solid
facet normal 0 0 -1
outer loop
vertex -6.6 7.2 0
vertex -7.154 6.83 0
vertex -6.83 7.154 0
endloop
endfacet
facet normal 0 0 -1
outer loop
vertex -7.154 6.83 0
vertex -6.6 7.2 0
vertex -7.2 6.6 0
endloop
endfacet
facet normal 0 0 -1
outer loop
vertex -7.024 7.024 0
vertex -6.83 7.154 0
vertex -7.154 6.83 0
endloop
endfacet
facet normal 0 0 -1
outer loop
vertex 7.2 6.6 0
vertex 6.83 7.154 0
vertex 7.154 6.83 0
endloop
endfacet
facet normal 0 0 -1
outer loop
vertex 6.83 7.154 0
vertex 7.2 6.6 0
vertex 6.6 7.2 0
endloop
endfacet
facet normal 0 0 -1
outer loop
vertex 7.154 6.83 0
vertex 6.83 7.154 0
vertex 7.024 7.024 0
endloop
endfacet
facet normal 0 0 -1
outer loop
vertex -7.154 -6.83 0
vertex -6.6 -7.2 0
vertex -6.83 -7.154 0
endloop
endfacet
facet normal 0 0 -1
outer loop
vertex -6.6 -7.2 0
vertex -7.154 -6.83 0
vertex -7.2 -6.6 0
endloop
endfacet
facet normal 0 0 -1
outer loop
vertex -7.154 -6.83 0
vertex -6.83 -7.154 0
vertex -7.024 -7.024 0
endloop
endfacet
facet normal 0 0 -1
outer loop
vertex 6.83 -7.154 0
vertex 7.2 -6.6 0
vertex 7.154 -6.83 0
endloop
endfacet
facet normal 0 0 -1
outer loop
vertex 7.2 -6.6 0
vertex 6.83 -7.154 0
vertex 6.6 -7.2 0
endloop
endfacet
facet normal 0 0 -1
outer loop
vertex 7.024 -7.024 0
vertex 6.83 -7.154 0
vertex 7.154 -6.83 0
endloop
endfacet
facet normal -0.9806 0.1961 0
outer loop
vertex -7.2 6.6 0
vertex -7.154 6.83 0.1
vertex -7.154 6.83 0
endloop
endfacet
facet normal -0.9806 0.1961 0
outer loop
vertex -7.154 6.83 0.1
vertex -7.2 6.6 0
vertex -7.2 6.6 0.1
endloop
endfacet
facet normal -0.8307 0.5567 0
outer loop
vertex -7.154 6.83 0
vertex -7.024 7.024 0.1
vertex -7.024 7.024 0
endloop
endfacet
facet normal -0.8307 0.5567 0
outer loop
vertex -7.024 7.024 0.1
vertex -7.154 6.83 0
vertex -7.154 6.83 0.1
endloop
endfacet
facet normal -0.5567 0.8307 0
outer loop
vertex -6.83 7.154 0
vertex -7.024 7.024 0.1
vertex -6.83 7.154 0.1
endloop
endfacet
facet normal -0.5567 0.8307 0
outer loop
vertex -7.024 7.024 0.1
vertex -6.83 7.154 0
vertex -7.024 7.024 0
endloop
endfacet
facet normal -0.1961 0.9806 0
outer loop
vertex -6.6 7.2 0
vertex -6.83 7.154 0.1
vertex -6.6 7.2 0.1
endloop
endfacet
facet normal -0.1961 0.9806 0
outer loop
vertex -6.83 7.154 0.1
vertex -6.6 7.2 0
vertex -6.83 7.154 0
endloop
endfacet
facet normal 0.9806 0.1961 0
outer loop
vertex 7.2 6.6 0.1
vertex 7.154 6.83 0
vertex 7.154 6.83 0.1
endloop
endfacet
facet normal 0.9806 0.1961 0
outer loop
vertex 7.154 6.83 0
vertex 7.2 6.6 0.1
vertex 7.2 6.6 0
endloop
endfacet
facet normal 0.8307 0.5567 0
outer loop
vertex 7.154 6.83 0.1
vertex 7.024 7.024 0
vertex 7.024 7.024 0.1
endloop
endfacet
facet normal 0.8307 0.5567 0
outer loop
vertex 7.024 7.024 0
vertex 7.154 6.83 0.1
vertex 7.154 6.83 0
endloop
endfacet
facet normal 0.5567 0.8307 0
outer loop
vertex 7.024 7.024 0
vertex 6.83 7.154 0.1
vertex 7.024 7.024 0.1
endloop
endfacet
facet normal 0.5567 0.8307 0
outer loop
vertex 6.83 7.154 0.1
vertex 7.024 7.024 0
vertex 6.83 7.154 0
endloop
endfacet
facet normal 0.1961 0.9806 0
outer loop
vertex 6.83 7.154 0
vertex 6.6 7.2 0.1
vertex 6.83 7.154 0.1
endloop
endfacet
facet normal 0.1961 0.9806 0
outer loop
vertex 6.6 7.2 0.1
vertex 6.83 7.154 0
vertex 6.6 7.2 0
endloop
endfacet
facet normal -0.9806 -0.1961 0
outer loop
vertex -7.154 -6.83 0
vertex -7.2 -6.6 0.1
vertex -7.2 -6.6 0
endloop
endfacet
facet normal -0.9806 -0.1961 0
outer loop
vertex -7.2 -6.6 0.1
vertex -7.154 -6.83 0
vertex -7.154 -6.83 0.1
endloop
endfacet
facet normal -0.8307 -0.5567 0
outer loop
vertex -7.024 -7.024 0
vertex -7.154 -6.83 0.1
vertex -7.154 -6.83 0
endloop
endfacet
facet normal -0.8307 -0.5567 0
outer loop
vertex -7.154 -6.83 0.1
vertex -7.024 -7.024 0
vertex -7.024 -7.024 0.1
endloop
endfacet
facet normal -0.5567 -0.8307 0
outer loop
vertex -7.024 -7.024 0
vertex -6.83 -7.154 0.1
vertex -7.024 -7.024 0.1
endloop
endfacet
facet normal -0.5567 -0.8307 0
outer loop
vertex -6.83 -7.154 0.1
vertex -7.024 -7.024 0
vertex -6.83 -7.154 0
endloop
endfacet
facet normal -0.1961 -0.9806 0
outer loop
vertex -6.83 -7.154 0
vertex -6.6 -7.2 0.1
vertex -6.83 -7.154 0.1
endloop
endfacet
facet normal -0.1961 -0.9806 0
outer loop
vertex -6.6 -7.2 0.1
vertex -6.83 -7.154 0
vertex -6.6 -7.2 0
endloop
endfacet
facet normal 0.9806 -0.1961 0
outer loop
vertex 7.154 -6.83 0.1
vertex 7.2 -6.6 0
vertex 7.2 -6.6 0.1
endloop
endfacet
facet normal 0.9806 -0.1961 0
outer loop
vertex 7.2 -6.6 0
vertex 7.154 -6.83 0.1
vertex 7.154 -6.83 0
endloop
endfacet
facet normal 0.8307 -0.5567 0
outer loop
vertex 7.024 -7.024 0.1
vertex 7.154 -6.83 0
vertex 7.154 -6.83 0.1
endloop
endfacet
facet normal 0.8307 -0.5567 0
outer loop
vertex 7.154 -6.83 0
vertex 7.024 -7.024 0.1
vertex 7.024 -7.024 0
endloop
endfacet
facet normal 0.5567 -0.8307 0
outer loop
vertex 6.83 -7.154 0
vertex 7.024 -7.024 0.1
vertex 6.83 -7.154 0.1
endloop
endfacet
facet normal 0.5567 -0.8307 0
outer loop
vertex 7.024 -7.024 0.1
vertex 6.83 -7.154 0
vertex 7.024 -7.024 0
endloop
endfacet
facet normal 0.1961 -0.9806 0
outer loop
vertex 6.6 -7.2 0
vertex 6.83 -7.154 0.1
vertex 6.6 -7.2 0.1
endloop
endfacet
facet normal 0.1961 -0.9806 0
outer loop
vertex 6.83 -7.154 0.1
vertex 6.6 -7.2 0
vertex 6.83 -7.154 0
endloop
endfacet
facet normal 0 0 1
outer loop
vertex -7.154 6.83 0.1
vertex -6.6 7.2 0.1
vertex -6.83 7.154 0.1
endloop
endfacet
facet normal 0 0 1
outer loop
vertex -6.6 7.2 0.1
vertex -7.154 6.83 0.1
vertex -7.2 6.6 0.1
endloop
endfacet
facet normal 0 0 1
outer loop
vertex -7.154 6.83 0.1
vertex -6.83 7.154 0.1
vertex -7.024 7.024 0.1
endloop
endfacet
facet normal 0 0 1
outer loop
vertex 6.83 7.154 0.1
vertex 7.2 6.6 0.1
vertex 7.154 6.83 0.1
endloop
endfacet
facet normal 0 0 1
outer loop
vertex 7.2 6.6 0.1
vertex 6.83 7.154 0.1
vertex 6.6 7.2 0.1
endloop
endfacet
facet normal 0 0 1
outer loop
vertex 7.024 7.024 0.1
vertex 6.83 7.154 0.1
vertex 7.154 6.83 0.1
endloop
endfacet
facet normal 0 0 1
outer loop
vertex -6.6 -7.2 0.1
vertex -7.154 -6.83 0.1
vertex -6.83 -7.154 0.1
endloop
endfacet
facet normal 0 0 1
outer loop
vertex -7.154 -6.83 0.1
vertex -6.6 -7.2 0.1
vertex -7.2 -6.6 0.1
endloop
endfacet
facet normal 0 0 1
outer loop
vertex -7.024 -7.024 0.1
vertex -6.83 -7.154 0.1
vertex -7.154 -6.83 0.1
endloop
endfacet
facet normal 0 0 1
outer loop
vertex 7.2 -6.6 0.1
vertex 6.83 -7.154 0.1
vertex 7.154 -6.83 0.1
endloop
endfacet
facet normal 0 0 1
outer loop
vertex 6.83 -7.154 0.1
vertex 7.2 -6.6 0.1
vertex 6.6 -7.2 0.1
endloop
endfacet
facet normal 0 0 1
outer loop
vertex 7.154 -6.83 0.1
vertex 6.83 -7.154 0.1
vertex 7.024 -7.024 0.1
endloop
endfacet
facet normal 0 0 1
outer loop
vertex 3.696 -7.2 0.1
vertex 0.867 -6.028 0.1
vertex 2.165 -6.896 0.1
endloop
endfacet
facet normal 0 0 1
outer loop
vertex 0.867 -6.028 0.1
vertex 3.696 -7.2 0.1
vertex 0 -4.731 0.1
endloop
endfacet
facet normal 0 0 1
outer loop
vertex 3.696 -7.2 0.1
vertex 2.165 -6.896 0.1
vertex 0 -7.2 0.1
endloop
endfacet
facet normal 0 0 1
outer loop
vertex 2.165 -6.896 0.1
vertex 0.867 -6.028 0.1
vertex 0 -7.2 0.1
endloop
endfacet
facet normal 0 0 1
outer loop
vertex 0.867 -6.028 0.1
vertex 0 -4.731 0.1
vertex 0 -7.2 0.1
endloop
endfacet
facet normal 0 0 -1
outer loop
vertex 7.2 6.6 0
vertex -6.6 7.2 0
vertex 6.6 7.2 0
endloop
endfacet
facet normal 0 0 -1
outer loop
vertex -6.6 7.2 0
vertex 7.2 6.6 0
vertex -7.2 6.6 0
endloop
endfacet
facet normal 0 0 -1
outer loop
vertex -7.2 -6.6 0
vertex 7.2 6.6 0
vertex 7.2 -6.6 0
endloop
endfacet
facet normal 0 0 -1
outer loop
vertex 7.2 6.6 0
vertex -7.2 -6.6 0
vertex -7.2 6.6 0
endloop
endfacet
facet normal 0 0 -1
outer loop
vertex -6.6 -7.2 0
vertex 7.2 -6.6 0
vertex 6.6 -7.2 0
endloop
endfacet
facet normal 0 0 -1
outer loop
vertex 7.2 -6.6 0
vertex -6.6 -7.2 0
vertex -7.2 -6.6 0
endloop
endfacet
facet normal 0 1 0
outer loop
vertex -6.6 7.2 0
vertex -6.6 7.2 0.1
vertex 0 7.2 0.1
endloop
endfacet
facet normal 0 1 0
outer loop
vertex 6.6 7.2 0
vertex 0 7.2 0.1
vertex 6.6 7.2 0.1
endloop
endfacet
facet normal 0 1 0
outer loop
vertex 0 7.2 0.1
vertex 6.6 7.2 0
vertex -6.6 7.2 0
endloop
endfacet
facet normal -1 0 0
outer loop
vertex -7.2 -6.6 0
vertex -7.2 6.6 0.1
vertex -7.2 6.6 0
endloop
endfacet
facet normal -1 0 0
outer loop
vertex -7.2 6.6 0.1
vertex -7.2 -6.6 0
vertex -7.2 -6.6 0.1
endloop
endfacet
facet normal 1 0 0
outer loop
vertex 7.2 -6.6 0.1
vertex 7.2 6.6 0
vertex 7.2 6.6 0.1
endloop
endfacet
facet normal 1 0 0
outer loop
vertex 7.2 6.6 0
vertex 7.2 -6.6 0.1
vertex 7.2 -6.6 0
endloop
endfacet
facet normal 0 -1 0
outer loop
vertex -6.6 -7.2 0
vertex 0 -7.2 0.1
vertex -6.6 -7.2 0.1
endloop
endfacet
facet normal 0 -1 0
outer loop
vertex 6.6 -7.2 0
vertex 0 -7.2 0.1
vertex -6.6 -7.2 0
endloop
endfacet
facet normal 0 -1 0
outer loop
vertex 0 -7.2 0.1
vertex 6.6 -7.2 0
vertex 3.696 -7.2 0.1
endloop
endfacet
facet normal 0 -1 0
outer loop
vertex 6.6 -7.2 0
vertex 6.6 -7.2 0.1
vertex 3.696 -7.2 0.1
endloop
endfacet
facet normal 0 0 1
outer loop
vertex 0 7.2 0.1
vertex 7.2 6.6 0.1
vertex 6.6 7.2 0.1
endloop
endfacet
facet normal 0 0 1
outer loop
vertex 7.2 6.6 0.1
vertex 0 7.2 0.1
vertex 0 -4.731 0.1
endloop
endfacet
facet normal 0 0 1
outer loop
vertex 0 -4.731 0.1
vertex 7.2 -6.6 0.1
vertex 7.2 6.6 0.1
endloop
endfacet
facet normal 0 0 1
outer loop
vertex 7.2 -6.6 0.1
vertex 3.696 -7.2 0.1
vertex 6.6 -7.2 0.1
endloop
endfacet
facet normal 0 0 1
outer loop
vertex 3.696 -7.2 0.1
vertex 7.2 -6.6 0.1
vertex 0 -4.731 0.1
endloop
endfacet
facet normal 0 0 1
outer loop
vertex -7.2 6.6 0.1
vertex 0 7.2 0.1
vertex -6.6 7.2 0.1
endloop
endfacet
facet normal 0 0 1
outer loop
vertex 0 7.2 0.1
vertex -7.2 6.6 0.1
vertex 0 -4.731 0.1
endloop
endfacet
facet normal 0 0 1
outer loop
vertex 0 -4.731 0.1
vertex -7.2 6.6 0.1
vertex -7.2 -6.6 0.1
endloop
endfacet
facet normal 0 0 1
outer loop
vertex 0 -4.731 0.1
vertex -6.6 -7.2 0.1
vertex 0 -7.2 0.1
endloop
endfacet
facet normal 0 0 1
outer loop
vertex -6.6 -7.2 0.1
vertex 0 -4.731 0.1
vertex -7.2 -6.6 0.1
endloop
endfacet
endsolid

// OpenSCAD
// file: ../p/3-16tndis.scad
use <../lib.scad>
function ldraw_lib__3_16tndis() = [
// 0 Disc Negative Truncated 0.1875
// 0 Name: 3-16tndis.dat
// 0 Author: Massimo Maso [Sirio]
// 0 !LDRAW_ORG Primitive UPDATE 2022-02
// 0 !LICENSE Licensed under CC BY 2.0 and CC BY 4.0 : see CAreadme.txt
// 
// 0 BFC CERTIFY CCW
  [0,"BFC","CERTIFY"],
  [0,"BFC","CCW"],
// 
// 0 !HISTORY 2022-03-06 [PTadmin] Official Update 2022-02
// 
// 
// 3 16 1 0 .9239 .9239 0 .3827 1 0 0
  [3,16,1,0,.9239,.9239,0,.3827,1,0,0],
// 3 16 1 0 .9239 .7071 0 .7071 .9239 0 .3827
  [3,16,1,0,.9239,.7071,0,.7071,.9239,0,.3827],
// 3 16 1 0 .9239 .3827 0 .9239 .7071 0 .7071
  [3,16,1,0,.9239,.3827,0,.9239,.7071,0,.7071],
];
makepoly(ldraw_lib__3_16tndis(), line=0.2);
// file: ../p/3-16chrd.scad
use <../lib.scad>
function ldraw_lib__3_16chrd() = [
// 0 Chord 0.1875
// 0 Name: 3-16chrd.dat
// 0 Author: Niels Karsdorp [nielsk]
// 0 !LDRAW_ORG Primitive UPDATE 2009-01
// 0 !LICENSE Licensed under CC BY 2.0 and CC BY 4.0 : see CAreadme.txt
// 
// 0 BFC CERTIFY CCW
  [0,"BFC","CERTIFY"],
  [0,"BFC","CCW"],
// 
// 0 !HISTORY 2009-05-02 [PTadmin] Official Update 2009-01
// 
// 
// 4 16 1 0 0 0.9239 0 0.3827 0.7071 0 0.7071 0.3827 0 0.9239
  [4,16,1,0,0,0.9239,0,0.3827,0.7071,0,0.7071,0.3827,0,0.9239],
// 0
// 
];
makepoly(ldraw_lib__3_16chrd(), line=0.2);
// file: ../p/1-4cyli.scad
use <../lib.scad>
function ldraw_lib__1_4cyli() = [
// 0 Cylinder 0.25
// 0 Name: 1-4cyli.dat
// 0 Author: James Jessiman
// 0 !LDRAW_ORG Primitive UPDATE 2012-01
// 0 !LICENSE Licensed under CC BY 2.0 and CC BY 4.0 : see CAreadme.txt
// 
// 0 BFC CERTIFY CCW
  [0,"BFC","CERTIFY"],
  [0,"BFC","CCW"],
// 
// 0 !HISTORY 2002-03-23 [sbliss] Added BFC statement.
// 0 !HISTORY 2002-04-25 [PTadmin] Official Update 2002-02
// 0 !HISTORY 2007-06-22 [PTadmin] Header formatted for Contributor Agreement
// 0 !HISTORY 2008-07-01 [PTadmin] Official Update 2008-01
// 0 !HISTORY 2012-02-16 [Philo] Changed to CCW
// 0 !HISTORY 2012-03-30 [PTadmin] Official Update 2012-01
// 
// 
// 4 16 1 1 0 0.9239 1 0.3827 0.9239 0 0.3827 1 0 0
  [4,16,1,1,0,0.9239,1,0.3827,0.9239,0,0.3827,1,0,0],
// 5 24 1 0 0 1 1 0 0.9239 0 0.3827 1 0 -1
  [5,24,1,0,0,1,1,0,0.9239,0,0.3827,1,0,-1],
// 4 16 0.9239 1 0.3827 0.7071 1 0.7071 0.7071 0 0.7071 0.9239 0 0.3827
  [4,16,0.9239,1,0.3827,0.7071,1,0.7071,0.7071,0,0.7071,0.9239,0,0.3827],
// 5 24 0.9239 0 0.3827 0.9239 1 0.3827 0.7071 0 0.7071 1 0 0
  [5,24,0.9239,0,0.3827,0.9239,1,0.3827,0.7071,0,0.7071,1,0,0],
// 4 16 0.7071 1 0.7071 0.3827 1 0.9239 0.3827 0 0.9239 0.7071 0 0.7071
  [4,16,0.7071,1,0.7071,0.3827,1,0.9239,0.3827,0,0.9239,0.7071,0,0.7071],
// 5 24 0.7071 0 0.7071 0.7071 1 0.7071 0.3827 0 0.9239 0.9239 0 0.3827
  [5,24,0.7071,0,0.7071,0.7071,1,0.7071,0.3827,0,0.9239,0.9239,0,0.3827],
// 4 16 0.3827 1 0.9239 0 1 1 0 0 1 0.3827 0 0.9239
  [4,16,0.3827,1,0.9239,0,1,1,0,0,1,0.3827,0,0.9239],
// 5 24 0.3827 0 0.9239 0.3827 1 0.9239 0 0 1 0.7071 0 0.7071
  [5,24,0.3827,0,0.9239,0.3827,1,0.9239,0,0,1,0.7071,0,0.7071],
// 5 24 0 0 1 0 1 1 0.3827 0 0.9239 -1 0 1
  [5,24,0,0,1,0,1,1,0.3827,0,0.9239,-1,0,1],
];
makepoly(ldraw_lib__1_4cyli(), line=0.2);
// file: ../p/1-4chrd.scad
use <../lib.scad>
function ldraw_lib__1_4chrd() = [
// 0 Chord 0.25
// 0 Name: 1-4chrd.dat
// 0 Author: Tony Hafner [hafhead]
// 0 !LDRAW_ORG Primitive UPDATE 2012-02
// 0 !LICENSE Licensed under CC BY 2.0 and CC BY 4.0 : see CAreadme.txt
// 
// 0 BFC CERTIFY CCW
  [0,"BFC","CERTIFY"],
  [0,"BFC","CCW"],
// 
// 0 !HISTORY 2004-04-22 [PTadmin] Official Update 2004-02
// 0 !HISTORY 2007-10-09 [PTadmin] Header formatted for Contributor Agreement
// 0 !HISTORY 2008-07-01 [PTadmin] Official Update 2008-01
// 0 !HISTORY 2012-08-02 [MMR1988] Re-creation with PrimGen2 and Rectifier
// 0 !HISTORY 2012-08-09 [PTadmin] Official Update 2012-02
// 
// 
// 4 16 0.9239 0 0.3827 0.3827 0 0.9239 0 0 1 1 0 0
  [4,16,0.9239,0,0.3827,0.3827,0,0.9239,0,0,1,1,0,0],
// 3 16 0.7071 0 0.7071 0.3827 0 0.9239 0.9239 0 0.3827
  [3,16,0.7071,0,0.7071,0.3827,0,0.9239,0.9239,0,0.3827],
];
makepoly(ldraw_lib__1_4chrd(), line=0.2);
// main file
use <../lib.scad>
use <../p/1-4chrd.scad>
use <../p/1-4cyli.scad>
use <../p/3-16chrd.scad>
use <../p/3-16tndis.scad>
function ldraw_lib__6141875o() = [
// 0 Sticker  1.8 x  1.8 with Black Trapezoid on Blue Background Right
// 0 Name: 6141875o.dat
// 0 Author: Massimo Maso [Sirio]
// 0 !LDRAW_ORG Part UPDATE 2022-06
// 0 !LICENSE Licensed under CC BY 2.0 and CC BY 4.0 : see CAreadme.txt
// 
// 0 BFC CERTIFY CCW
  [0,"BFC","CERTIFY"],
  [0,"BFC","CCW"],
// 
// 0 !KEYWORDS Bricklink 75875stk01, Brickowl 53567, F-150, Ford, Raptor
// 0 !KEYWORDS Rebrickable 24760, Set 75875, Speed Champions
// 
// 0 !HISTORY 2022-12-20 [PTadmin] Official Update 2022-06
// 
// 
// 0 // Primitives
// 
// 1 16 -16.5 0 16.5 -1.5 0 0 0 -1 0 0 0 1.5 1-4chrd.dat
  [1,16,-16.5,0,16.5,-1.5,0,0,0,-1,0,0,0,1.5, ldraw_lib__1_4chrd()],
// 1 16 16.5 0 16.5 1.5 0 0 0 -1 0 0 0 1.5 1-4chrd.dat
  [1,16,16.5,0,16.5,1.5,0,0,0,-1,0,0,0,1.5, ldraw_lib__1_4chrd()],
// 1 16 -16.5 0 -16.5 -1.5 0 0 0 -1 0 0 0 -1.5 1-4chrd.dat
  [1,16,-16.5,0,-16.5,-1.5,0,0,0,-1,0,0,0,-1.5, ldraw_lib__1_4chrd()],
// 1 16 16.5 0 -16.5 1.5 0 0 0 -1 0 0 0 -1.5 1-4chrd.dat
  [1,16,16.5,0,-16.5,1.5,0,0,0,-1,0,0,0,-1.5, ldraw_lib__1_4chrd()],
// 1 16 -16.5 0 16.5 -1.5 0 0 0 -.25 0 0 0 1.5 1-4cyli.dat
  [1,16,-16.5,0,16.5,-1.5,0,0,0,-.25,0,0,0,1.5, ldraw_lib__1_4cyli()],
// 1 16 16.5 0 16.5 1.5 0 0 0 -.25 0 0 0 1.5 1-4cyli.dat
  [1,16,16.5,0,16.5,1.5,0,0,0,-.25,0,0,0,1.5, ldraw_lib__1_4cyli()],
// 1 16 -16.5 0 -16.5 -1.5 0 0 0 -.25 0 0 0 -1.5 1-4cyli.dat
  [1,16,-16.5,0,-16.5,-1.5,0,0,0,-.25,0,0,0,-1.5, ldraw_lib__1_4cyli()],
// 1 16 16.5 0 -16.5 1.5 0 0 0 -.25 0 0 0 -1.5 1-4cyli.dat
  [1,16,16.5,0,-16.5,1.5,0,0,0,-.25,0,0,0,-1.5, ldraw_lib__1_4cyli()],
// 1 1 -16.5 -.25 16.5 -1.5 0 0 0 1 0 0 0 1.5 1-4chrd.dat
  [1,1,-16.5,-.25,16.5,-1.5,0,0,0,1,0,0,0,1.5, ldraw_lib__1_4chrd()],
// 1 0 16.5 -.25 16.5 1.5 0 0 0 1 0 0 0 1.5 1-4chrd.dat
  [1,0,16.5,-.25,16.5,1.5,0,0,0,1,0,0,0,1.5, ldraw_lib__1_4chrd()],
// 1 1 -16.5 -.25 -16.5 -1.5 0 0 0 1 0 0 0 -1.5 1-4chrd.dat
  [1,1,-16.5,-.25,-16.5,-1.5,0,0,0,1,0,0,0,-1.5, ldraw_lib__1_4chrd()],
// 1 0 16.5 -.25 -16.5 1.5 0 0 0 1 0 0 0 -1.5 1-4chrd.dat
  [1,0,16.5,-.25,-16.5,1.5,0,0,0,1,0,0,0,-1.5, ldraw_lib__1_4chrd()],
// 1 0 9.239 -.25 -8 0 0 -10 0 1 0 -10 0 0 3-16chrd.dat
  [1,0,9.239,-.25,-8,0,0,-10,0,1,0,-10,0,0, ldraw_lib__3_16chrd()],
// 1 1 9.239 -.25 -8 0 0 -10 0 1 0 -10 0 0 3-16tndis.dat
  [1,1,9.239,-.25,-8,0,0,-10,0,1,0,-10,0,0, ldraw_lib__3_16tndis()],
// 0 // Bottom face
// 4 16 16.5 0 18 18 0 16.5 -18 0 16.5 -16.5 0 18
  [4,16,16.5,0,18,18,0,16.5,-18,0,16.5,-16.5,0,18],
// 4 16 18 0 16.5 18 0 -16.5 -18 0 -16.5 -18 0 16.5
  [4,16,18,0,16.5,18,0,-16.5,-18,0,-16.5,-18,0,16.5],
// 4 16 16.5 0 -18 -16.5 0 -18 -18 0 -16.5 18 0 -16.5
  [4,16,16.5,0,-18,-16.5,0,-18,-18,0,-16.5,18,0,-16.5],
// 0 // Lateral face
// 3 16 -16.5 0 18 -16.5 -.25 18 0 -.25 18
  [3,16,-16.5,0,18,-16.5,-.25,18,0,-.25,18],
// 4 16 -16.5 0 18 0 -.25 18 16.5 -.25 18 16.5 0 18
  [4,16,-16.5,0,18,0,-.25,18,16.5,-.25,18,16.5,0,18],
// 4 16 -18 0 16.5 -18 0 -16.5 -18 -.25 -16.5 -18 -.25 16.5
  [4,16,-18,0,16.5,-18,0,-16.5,-18,-.25,-16.5,-18,-.25,16.5],
// 4 16 18 0 16.5 18 -.25 16.5 18 -.25 -16.5 18 0 -16.5
  [4,16,18,0,16.5,18,-.25,16.5,18,-.25,-16.5,18,0,-16.5],
// 3 16 -16.5 0 -18 0 -.25 -18 -16.5 -.25 -18
  [3,16,-16.5,0,-18,0,-.25,-18,-16.5,-.25,-18],
// 4 16 -16.5 0 -18 16.5 0 -18 9.239 -.25 -18 0 -.25 -18
  [4,16,-16.5,0,-18,16.5,0,-18,9.239,-.25,-18,0,-.25,-18],
// 3 16 16.5 0 -18 16.5 -.25 -18 9.239 -.25 -18
  [3,16,16.5,0,-18,16.5,-.25,-18,9.239,-.25,-18],
// 0 // Top face
// 0 // Black faces
// 4 0 0 -.25 -11.827 18 -.25 16.5 16.5 -.25 18 0 -.25 18
  [4,0,0,-.25,-11.827,18,-.25,16.5,16.5,-.25,18,0,-.25,18],
// 3 0 0 -.25 -11.827 18 -.25 -16.5 18 -.25 16.5
  [3,0,0,-.25,-11.827,18,-.25,-16.5,18,-.25,16.5],
// 4 0 0 -.25 -11.827 9.239 -.25 -18 16.5 -.25 -18 18 -.25 -16.5
  [4,0,0,-.25,-11.827,9.239,-.25,-18,16.5,-.25,-18,18,-.25,-16.5],
// 0 // Blue faces
// 4 1 0 -.25 -11.827 0 -.25 18 -16.5 -.25 18 -18 -.25 16.5
  [4,1,0,-.25,-11.827,0,-.25,18,-16.5,-.25,18,-18,-.25,16.5],
// 3 1 0 -.25 -11.827 -18 -.25 16.5 -18 -.25 -16.5
  [3,1,0,-.25,-11.827,-18,-.25,16.5,-18,-.25,-16.5],
// 4 1 0 -.25 -11.827 -18 -.25 -16.5 -16.5 -.25 -18 0 -.25 -18
  [4,1,0,-.25,-11.827,-18,-.25,-16.5,-16.5,-.25,-18,0,-.25,-18],
];
makepoly(ldraw_lib__6141875o(), line=0.2);
